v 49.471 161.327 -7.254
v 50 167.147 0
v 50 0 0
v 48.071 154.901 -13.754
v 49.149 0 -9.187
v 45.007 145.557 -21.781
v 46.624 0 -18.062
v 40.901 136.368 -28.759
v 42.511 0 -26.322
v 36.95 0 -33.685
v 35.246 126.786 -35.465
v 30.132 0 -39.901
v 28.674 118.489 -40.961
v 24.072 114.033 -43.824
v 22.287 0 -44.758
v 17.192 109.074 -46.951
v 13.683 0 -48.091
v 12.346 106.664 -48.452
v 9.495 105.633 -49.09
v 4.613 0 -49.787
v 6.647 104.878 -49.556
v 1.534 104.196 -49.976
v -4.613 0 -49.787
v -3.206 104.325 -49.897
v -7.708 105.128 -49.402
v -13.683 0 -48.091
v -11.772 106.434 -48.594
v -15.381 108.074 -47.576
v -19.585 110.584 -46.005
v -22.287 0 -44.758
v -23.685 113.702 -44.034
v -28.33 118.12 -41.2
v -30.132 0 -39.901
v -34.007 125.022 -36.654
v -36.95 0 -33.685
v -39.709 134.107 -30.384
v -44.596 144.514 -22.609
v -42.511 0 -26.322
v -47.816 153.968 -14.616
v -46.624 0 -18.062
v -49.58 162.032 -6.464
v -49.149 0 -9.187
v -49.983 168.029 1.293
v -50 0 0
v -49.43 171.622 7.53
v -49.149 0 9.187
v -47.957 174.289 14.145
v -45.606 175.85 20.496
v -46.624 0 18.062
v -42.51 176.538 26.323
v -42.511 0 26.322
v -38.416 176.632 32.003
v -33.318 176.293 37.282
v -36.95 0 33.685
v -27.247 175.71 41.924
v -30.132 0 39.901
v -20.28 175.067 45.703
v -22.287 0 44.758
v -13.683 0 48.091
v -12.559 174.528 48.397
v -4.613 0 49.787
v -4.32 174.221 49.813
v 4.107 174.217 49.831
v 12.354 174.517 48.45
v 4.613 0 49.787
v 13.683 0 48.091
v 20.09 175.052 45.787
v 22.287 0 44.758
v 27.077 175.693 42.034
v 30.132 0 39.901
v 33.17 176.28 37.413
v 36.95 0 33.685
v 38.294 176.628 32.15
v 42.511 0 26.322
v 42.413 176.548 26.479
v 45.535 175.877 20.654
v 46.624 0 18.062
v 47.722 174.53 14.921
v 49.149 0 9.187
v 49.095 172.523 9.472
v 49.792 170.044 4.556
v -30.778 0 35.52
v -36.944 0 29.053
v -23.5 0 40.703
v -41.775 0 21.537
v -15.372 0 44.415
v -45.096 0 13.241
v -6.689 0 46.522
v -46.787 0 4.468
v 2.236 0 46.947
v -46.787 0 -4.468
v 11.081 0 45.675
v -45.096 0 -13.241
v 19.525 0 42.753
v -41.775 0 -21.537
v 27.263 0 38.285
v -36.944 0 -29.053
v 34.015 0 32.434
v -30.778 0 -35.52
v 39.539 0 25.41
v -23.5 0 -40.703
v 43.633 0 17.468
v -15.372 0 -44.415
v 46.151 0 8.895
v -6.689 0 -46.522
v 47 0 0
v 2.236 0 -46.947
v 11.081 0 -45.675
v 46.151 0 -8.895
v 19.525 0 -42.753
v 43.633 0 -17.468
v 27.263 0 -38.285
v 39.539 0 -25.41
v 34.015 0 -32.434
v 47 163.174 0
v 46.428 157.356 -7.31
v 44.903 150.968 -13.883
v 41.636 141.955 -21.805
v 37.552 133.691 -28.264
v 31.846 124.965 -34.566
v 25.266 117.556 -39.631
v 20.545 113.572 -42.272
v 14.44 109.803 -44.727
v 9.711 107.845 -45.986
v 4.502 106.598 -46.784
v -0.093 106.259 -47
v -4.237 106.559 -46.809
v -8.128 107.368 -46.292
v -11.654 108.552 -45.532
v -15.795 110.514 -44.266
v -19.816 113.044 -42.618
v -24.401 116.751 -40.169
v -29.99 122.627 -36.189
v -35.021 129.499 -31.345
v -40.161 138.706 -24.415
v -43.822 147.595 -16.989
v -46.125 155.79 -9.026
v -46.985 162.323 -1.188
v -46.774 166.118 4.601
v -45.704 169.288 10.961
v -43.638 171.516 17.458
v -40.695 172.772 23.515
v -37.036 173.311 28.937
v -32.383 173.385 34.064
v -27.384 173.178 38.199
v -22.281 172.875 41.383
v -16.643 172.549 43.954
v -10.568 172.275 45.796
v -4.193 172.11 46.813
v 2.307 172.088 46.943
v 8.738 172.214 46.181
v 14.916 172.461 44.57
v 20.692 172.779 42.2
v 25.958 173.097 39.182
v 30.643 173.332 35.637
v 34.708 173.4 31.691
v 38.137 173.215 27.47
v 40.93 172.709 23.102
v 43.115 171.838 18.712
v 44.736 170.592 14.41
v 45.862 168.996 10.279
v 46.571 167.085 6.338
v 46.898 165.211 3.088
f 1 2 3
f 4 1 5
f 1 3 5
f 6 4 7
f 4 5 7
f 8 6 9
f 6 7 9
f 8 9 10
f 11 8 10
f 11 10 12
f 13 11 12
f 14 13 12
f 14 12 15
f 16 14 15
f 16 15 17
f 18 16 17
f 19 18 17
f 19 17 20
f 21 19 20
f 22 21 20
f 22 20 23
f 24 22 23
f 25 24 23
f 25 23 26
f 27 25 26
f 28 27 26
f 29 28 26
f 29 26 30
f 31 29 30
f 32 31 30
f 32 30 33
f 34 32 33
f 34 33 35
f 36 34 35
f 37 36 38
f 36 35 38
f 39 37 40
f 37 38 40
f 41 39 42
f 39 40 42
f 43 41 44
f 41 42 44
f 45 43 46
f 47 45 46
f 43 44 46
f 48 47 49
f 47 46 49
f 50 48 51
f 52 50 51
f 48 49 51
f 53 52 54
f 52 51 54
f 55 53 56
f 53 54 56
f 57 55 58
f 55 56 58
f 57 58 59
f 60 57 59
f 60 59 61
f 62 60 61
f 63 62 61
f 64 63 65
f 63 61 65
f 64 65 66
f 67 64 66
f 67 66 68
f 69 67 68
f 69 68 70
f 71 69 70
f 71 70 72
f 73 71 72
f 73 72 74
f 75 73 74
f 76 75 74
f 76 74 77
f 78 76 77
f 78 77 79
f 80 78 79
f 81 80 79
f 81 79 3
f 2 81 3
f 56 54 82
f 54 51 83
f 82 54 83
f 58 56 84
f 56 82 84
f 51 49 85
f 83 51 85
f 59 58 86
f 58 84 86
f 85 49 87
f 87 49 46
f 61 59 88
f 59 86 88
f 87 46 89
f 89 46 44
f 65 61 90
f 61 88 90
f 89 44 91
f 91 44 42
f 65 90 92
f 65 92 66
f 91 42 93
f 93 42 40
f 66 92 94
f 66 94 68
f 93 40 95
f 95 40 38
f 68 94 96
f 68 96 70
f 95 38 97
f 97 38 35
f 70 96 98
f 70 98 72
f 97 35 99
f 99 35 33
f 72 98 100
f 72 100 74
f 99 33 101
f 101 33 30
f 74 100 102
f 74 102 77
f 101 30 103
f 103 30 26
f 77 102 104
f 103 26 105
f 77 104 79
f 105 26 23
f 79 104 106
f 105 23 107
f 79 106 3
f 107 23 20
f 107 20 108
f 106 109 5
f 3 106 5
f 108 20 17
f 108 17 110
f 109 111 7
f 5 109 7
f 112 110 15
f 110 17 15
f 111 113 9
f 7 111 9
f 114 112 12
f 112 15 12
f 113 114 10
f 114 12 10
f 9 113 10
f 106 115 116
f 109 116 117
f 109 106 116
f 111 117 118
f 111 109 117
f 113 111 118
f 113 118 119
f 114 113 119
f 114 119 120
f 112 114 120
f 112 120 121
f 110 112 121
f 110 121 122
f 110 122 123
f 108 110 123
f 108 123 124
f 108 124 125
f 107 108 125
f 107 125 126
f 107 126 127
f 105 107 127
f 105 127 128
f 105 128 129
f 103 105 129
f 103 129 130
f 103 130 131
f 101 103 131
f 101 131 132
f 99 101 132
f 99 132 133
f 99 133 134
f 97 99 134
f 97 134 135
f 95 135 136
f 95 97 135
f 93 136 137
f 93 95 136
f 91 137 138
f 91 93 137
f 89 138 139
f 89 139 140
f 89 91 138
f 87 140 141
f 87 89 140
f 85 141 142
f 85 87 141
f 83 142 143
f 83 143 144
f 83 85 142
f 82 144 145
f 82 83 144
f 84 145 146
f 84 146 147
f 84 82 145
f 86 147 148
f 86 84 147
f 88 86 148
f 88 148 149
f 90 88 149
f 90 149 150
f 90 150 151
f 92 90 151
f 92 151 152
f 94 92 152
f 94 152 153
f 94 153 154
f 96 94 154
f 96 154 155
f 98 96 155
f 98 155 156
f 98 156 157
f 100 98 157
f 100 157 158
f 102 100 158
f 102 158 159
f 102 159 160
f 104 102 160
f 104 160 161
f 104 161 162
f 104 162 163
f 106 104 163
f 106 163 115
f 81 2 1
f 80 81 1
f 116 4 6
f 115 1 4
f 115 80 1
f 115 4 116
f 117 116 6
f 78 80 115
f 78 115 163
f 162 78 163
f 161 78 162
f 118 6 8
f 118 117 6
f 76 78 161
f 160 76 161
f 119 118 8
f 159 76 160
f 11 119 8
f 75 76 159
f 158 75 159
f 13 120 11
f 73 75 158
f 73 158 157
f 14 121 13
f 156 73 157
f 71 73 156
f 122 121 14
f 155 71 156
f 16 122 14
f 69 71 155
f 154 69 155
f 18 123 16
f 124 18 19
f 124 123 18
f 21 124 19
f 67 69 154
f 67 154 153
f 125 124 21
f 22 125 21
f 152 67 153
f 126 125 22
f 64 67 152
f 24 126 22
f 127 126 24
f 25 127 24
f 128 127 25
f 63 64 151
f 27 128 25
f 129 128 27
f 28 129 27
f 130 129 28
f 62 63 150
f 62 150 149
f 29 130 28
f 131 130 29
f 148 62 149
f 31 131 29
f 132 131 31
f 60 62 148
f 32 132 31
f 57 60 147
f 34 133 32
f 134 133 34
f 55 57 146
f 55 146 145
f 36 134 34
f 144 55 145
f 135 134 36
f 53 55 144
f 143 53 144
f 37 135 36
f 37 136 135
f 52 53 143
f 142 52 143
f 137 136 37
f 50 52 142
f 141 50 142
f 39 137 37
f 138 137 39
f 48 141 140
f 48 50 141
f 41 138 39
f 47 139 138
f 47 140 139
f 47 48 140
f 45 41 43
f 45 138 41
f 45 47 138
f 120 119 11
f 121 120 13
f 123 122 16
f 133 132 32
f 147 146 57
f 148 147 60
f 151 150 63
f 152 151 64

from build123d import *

# Parameters (mm, degrees)
EXTRUDE_1_OUTLINE_R      = 50
EXTRUDE_1_OUTLINE_R_2    = 47
EXTRUDE_1_DEPTH          = 200
CUT_EXTRUDE_1_DEPTH      = 213.132034356
CUT_EXTRUDE_1_DEPTH_BACK = 213.132034356
SKETCH_2_R               = 66


# Read off the part's stored shape, not the designer's step: Вытянуть-Тонкостенный1
with BuildPart() as part:
    # Вытянуть-Тонкостенный1 outline → Вытянуть-Тонкостенный1 (new body)
    with BuildSketch(Plane(origin=(0, 0, 0), x_dir=(1, 0, 0), z_dir=(0, 1, 0))):
        Circle(EXTRUDE_1_OUTLINE_R)
        Circle(EXTRUDE_1_OUTLINE_R_2, mode=Mode.SUBTRACT)
    extrude(amount=EXTRUDE_1_DEPTH)

    # Эскиз2 → Вырез-Вытянуть1 (cut, two sides: drawn at the far end of the back side and taken through both)
    with BuildSketch(Plane(origin=(0, 0, 0), x_dir=(1, 0, 0), z_dir=(0, -0.5735764363510444, -0.819152044288993)).offset(-CUT_EXTRUDE_1_DEPTH_BACK)):
        with Locations((0, -180)):
            Circle(SKETCH_2_R)
    extrude(amount=CUT_EXTRUDE_1_DEPTH + CUT_EXTRUDE_1_DEPTH_BACK, mode=Mode.SUBTRACT)


solid = part.part
